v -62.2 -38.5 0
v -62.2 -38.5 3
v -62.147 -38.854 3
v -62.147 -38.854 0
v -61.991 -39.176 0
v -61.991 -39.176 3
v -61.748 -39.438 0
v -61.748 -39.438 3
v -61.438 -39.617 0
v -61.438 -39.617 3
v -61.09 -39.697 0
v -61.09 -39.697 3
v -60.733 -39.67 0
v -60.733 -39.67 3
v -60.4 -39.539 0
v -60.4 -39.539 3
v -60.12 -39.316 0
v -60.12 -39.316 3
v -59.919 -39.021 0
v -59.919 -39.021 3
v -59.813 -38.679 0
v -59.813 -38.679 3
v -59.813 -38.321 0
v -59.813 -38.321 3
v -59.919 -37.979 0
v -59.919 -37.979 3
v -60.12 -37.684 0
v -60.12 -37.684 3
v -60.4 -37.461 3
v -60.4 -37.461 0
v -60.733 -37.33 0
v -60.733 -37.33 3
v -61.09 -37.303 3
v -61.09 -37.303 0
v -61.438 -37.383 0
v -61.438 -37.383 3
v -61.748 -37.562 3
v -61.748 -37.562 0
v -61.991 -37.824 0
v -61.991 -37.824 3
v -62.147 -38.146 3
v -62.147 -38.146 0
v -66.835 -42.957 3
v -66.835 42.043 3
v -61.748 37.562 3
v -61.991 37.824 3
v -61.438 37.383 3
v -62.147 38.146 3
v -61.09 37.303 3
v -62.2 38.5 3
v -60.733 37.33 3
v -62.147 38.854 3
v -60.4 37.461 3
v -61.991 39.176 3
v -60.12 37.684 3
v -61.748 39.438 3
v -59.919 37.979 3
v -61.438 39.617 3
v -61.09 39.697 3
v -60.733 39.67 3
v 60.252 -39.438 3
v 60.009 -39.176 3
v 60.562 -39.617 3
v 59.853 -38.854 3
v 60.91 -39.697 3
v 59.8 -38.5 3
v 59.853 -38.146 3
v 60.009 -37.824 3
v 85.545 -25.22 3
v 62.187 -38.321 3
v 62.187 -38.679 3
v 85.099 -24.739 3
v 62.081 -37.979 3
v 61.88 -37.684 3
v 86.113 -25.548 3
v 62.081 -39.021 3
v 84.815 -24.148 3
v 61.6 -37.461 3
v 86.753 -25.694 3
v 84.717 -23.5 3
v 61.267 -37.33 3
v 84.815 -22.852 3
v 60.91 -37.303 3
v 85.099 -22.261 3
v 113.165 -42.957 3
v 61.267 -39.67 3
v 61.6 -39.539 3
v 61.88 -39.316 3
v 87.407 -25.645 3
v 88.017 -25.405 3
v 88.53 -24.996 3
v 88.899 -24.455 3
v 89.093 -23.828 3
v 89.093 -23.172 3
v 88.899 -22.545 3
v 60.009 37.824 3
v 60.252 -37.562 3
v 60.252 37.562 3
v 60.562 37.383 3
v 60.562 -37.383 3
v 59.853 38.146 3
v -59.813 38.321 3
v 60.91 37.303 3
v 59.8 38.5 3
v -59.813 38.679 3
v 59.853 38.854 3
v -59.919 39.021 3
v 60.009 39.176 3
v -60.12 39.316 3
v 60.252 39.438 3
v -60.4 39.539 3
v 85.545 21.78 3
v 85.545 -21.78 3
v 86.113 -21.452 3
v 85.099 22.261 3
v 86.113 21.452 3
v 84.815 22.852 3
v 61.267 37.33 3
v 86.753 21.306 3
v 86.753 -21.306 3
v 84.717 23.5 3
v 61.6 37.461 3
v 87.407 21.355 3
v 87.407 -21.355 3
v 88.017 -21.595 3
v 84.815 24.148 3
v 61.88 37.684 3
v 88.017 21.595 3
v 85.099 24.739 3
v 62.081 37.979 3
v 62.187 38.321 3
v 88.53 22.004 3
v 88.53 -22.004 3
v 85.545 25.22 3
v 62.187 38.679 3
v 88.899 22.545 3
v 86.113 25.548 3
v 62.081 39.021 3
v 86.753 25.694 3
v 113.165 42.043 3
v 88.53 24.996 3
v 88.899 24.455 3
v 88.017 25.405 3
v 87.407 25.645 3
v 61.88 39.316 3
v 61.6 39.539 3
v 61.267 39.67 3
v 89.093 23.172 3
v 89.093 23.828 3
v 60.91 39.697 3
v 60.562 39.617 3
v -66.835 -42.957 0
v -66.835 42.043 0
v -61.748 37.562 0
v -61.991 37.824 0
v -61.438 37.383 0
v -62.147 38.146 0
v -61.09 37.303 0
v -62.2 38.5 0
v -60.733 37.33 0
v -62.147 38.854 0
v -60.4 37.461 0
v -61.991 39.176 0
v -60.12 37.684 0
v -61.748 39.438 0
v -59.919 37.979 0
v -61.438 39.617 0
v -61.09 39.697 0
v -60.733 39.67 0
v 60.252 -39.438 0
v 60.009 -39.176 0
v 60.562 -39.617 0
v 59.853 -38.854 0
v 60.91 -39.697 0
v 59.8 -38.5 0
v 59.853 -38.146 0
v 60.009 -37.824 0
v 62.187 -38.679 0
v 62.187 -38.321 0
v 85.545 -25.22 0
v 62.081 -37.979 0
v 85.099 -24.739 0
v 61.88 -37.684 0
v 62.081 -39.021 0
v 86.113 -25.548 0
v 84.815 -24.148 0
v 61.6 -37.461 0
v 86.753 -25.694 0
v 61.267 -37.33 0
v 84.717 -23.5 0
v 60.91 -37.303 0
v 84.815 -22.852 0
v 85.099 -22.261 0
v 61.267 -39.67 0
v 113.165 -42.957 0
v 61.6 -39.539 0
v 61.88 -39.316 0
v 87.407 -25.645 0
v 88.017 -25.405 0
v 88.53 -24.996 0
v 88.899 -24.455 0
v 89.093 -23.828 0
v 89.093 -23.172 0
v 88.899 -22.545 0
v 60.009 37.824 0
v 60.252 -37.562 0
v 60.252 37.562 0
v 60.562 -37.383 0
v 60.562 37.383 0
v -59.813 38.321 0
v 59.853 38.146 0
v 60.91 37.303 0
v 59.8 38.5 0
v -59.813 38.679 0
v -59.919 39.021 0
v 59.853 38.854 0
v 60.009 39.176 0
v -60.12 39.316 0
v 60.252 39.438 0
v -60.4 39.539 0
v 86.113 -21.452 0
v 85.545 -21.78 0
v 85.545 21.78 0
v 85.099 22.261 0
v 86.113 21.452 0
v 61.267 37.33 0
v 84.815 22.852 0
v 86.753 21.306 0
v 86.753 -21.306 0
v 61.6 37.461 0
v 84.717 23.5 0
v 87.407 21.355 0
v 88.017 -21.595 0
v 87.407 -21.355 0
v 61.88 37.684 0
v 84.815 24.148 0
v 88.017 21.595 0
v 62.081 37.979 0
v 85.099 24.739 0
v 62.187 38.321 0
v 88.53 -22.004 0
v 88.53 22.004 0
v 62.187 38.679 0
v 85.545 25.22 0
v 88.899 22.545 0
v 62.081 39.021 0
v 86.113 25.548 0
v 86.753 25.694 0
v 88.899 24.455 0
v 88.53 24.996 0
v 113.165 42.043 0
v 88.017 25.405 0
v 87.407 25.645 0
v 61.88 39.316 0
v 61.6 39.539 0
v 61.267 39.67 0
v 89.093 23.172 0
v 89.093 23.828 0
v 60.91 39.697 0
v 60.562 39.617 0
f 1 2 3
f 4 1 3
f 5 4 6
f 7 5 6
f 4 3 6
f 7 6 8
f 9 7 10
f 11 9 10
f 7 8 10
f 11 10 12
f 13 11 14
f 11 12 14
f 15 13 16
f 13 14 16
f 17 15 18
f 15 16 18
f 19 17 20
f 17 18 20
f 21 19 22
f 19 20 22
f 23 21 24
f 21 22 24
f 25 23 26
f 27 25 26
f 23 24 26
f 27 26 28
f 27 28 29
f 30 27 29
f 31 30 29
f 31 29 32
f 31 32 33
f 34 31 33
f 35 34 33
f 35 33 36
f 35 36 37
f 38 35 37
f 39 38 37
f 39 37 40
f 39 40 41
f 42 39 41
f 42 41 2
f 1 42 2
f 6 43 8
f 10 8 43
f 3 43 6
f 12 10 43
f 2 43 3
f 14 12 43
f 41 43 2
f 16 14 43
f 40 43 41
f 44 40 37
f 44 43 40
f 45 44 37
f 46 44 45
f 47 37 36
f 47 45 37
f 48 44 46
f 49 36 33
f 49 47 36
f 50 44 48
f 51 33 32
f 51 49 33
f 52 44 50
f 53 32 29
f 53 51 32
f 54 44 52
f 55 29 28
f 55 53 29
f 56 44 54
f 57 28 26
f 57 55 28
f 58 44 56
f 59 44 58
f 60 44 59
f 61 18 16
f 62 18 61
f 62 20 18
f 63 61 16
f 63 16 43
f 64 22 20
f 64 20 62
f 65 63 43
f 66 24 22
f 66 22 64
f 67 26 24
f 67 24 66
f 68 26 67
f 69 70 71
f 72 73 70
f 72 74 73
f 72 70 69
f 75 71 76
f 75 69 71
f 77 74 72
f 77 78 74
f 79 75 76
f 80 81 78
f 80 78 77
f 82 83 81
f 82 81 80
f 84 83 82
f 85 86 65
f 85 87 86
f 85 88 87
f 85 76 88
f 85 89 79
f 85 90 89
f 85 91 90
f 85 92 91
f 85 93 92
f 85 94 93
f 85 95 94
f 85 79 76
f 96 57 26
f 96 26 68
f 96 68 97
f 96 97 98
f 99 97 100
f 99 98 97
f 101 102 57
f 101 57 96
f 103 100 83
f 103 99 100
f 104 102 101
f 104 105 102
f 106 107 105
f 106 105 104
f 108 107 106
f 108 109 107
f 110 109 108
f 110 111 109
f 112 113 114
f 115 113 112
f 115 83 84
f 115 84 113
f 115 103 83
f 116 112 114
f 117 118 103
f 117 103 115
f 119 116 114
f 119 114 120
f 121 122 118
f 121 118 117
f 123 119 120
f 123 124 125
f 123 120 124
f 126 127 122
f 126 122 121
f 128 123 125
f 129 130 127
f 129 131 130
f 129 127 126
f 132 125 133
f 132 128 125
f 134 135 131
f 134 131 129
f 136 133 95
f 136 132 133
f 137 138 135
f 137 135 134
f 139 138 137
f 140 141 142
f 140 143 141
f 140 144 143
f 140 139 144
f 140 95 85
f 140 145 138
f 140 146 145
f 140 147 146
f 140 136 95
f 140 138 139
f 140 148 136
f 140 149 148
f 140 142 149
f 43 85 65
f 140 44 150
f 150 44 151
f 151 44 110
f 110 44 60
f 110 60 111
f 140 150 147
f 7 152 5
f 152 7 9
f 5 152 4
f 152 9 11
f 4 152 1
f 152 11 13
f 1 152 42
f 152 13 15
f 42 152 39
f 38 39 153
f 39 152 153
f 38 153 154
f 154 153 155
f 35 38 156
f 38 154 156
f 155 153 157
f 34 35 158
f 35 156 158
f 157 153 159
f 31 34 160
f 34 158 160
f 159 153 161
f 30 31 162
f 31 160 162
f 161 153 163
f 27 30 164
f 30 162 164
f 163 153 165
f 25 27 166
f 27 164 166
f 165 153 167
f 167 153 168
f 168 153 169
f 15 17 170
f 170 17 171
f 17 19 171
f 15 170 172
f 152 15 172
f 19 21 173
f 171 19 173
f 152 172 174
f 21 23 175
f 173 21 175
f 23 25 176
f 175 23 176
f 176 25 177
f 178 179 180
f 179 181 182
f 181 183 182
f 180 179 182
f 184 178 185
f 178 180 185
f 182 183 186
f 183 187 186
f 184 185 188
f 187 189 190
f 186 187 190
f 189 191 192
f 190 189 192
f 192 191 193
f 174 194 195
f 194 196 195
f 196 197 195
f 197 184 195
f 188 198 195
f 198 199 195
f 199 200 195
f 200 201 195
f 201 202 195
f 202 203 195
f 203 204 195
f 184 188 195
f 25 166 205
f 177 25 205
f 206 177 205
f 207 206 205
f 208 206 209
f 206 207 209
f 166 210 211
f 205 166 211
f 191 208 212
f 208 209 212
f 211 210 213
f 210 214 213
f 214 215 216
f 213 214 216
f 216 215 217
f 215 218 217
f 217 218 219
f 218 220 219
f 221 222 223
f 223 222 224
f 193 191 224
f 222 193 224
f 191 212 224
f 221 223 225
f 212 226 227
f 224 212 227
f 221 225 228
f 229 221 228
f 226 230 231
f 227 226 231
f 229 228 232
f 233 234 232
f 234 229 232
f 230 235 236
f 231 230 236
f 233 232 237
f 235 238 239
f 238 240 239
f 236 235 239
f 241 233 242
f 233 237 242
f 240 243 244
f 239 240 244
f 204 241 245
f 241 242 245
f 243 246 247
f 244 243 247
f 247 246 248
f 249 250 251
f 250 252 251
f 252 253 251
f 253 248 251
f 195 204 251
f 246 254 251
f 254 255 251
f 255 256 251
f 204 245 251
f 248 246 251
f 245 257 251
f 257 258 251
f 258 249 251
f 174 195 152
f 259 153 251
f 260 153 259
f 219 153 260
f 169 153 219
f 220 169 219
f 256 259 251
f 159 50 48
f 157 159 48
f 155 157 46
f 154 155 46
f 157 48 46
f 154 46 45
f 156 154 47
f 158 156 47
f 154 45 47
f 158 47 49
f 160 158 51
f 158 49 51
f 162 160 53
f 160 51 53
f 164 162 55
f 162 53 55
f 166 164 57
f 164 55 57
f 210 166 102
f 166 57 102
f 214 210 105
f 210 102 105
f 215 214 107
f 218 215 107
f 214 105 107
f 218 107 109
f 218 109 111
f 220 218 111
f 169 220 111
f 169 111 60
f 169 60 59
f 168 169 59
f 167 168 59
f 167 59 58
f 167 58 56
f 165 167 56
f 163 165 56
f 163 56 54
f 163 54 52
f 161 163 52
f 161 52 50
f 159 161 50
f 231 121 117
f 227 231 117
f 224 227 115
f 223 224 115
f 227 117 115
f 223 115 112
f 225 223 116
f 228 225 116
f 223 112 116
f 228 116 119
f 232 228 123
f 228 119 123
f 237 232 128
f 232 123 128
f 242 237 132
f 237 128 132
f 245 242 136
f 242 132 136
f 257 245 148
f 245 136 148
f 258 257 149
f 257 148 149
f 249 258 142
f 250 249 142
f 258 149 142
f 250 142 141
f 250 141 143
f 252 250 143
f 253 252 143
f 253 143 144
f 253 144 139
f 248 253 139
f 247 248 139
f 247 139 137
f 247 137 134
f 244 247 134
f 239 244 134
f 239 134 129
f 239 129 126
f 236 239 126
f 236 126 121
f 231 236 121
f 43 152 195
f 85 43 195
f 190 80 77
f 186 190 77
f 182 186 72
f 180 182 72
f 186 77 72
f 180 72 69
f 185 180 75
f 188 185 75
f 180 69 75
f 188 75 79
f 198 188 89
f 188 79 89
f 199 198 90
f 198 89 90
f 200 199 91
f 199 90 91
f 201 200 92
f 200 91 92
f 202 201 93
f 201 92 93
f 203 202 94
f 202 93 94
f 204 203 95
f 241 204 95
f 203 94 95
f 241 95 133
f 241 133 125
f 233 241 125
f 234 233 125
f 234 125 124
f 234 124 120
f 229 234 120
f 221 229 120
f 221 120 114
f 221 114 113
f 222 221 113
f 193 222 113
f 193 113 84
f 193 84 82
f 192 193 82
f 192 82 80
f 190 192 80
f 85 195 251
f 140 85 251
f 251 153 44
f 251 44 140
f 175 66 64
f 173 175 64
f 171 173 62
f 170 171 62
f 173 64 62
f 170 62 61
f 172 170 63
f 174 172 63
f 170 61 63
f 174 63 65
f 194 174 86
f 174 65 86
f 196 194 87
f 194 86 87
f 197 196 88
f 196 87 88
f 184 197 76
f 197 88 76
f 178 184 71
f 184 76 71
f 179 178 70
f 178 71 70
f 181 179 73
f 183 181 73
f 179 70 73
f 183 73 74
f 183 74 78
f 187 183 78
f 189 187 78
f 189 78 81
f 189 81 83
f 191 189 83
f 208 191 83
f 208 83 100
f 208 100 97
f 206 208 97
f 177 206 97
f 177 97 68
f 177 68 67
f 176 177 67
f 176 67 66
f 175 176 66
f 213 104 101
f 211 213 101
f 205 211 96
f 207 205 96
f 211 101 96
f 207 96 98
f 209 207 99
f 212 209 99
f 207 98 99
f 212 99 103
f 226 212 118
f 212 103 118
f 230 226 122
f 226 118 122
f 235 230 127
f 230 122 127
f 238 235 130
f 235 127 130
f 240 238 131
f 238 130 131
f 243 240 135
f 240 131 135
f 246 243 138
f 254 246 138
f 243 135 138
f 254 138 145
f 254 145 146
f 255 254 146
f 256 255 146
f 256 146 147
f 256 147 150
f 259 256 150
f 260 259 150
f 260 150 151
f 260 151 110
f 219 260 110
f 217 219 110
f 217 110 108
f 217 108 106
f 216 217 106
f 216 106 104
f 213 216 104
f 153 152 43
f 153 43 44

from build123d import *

# Parameters (mm, degrees)
F0_W     = 180
F0_H     = 85
F1_DEPTH = 3
F2_D     = 2.4
F3_D     = 4.4


with BuildPart() as f1:
    # F0 (on Top) → F1 (new body)
    with BuildSketch(Plane.XY):
        with Locations((23.1652522087, -0.4566903412)):
            Rectangle(F0_W, F0_H)
    extrude(amount=F1_DEPTH)

    # F2 (through all)
    with Locations(Plane(origin=(0, 0, 0), x_dir=(1, 0, 0), z_dir=(0, 0, -1))):
        with Locations((-61, 38.5), (-61, -38.5), (61, 38.5), (61, -38.5)):
            Hole(F2_D / 2)

    # F3 (through all)
    with Locations(Plane(origin=(0, 0, 0), x_dir=(1, 0, 0), z_dir=(0, 0, -1))):
        with Locations((86.9170799851, -23.5), (86.9170799851, 23.5)):
            Hole(F3_D / 2)


solid = f1.part
